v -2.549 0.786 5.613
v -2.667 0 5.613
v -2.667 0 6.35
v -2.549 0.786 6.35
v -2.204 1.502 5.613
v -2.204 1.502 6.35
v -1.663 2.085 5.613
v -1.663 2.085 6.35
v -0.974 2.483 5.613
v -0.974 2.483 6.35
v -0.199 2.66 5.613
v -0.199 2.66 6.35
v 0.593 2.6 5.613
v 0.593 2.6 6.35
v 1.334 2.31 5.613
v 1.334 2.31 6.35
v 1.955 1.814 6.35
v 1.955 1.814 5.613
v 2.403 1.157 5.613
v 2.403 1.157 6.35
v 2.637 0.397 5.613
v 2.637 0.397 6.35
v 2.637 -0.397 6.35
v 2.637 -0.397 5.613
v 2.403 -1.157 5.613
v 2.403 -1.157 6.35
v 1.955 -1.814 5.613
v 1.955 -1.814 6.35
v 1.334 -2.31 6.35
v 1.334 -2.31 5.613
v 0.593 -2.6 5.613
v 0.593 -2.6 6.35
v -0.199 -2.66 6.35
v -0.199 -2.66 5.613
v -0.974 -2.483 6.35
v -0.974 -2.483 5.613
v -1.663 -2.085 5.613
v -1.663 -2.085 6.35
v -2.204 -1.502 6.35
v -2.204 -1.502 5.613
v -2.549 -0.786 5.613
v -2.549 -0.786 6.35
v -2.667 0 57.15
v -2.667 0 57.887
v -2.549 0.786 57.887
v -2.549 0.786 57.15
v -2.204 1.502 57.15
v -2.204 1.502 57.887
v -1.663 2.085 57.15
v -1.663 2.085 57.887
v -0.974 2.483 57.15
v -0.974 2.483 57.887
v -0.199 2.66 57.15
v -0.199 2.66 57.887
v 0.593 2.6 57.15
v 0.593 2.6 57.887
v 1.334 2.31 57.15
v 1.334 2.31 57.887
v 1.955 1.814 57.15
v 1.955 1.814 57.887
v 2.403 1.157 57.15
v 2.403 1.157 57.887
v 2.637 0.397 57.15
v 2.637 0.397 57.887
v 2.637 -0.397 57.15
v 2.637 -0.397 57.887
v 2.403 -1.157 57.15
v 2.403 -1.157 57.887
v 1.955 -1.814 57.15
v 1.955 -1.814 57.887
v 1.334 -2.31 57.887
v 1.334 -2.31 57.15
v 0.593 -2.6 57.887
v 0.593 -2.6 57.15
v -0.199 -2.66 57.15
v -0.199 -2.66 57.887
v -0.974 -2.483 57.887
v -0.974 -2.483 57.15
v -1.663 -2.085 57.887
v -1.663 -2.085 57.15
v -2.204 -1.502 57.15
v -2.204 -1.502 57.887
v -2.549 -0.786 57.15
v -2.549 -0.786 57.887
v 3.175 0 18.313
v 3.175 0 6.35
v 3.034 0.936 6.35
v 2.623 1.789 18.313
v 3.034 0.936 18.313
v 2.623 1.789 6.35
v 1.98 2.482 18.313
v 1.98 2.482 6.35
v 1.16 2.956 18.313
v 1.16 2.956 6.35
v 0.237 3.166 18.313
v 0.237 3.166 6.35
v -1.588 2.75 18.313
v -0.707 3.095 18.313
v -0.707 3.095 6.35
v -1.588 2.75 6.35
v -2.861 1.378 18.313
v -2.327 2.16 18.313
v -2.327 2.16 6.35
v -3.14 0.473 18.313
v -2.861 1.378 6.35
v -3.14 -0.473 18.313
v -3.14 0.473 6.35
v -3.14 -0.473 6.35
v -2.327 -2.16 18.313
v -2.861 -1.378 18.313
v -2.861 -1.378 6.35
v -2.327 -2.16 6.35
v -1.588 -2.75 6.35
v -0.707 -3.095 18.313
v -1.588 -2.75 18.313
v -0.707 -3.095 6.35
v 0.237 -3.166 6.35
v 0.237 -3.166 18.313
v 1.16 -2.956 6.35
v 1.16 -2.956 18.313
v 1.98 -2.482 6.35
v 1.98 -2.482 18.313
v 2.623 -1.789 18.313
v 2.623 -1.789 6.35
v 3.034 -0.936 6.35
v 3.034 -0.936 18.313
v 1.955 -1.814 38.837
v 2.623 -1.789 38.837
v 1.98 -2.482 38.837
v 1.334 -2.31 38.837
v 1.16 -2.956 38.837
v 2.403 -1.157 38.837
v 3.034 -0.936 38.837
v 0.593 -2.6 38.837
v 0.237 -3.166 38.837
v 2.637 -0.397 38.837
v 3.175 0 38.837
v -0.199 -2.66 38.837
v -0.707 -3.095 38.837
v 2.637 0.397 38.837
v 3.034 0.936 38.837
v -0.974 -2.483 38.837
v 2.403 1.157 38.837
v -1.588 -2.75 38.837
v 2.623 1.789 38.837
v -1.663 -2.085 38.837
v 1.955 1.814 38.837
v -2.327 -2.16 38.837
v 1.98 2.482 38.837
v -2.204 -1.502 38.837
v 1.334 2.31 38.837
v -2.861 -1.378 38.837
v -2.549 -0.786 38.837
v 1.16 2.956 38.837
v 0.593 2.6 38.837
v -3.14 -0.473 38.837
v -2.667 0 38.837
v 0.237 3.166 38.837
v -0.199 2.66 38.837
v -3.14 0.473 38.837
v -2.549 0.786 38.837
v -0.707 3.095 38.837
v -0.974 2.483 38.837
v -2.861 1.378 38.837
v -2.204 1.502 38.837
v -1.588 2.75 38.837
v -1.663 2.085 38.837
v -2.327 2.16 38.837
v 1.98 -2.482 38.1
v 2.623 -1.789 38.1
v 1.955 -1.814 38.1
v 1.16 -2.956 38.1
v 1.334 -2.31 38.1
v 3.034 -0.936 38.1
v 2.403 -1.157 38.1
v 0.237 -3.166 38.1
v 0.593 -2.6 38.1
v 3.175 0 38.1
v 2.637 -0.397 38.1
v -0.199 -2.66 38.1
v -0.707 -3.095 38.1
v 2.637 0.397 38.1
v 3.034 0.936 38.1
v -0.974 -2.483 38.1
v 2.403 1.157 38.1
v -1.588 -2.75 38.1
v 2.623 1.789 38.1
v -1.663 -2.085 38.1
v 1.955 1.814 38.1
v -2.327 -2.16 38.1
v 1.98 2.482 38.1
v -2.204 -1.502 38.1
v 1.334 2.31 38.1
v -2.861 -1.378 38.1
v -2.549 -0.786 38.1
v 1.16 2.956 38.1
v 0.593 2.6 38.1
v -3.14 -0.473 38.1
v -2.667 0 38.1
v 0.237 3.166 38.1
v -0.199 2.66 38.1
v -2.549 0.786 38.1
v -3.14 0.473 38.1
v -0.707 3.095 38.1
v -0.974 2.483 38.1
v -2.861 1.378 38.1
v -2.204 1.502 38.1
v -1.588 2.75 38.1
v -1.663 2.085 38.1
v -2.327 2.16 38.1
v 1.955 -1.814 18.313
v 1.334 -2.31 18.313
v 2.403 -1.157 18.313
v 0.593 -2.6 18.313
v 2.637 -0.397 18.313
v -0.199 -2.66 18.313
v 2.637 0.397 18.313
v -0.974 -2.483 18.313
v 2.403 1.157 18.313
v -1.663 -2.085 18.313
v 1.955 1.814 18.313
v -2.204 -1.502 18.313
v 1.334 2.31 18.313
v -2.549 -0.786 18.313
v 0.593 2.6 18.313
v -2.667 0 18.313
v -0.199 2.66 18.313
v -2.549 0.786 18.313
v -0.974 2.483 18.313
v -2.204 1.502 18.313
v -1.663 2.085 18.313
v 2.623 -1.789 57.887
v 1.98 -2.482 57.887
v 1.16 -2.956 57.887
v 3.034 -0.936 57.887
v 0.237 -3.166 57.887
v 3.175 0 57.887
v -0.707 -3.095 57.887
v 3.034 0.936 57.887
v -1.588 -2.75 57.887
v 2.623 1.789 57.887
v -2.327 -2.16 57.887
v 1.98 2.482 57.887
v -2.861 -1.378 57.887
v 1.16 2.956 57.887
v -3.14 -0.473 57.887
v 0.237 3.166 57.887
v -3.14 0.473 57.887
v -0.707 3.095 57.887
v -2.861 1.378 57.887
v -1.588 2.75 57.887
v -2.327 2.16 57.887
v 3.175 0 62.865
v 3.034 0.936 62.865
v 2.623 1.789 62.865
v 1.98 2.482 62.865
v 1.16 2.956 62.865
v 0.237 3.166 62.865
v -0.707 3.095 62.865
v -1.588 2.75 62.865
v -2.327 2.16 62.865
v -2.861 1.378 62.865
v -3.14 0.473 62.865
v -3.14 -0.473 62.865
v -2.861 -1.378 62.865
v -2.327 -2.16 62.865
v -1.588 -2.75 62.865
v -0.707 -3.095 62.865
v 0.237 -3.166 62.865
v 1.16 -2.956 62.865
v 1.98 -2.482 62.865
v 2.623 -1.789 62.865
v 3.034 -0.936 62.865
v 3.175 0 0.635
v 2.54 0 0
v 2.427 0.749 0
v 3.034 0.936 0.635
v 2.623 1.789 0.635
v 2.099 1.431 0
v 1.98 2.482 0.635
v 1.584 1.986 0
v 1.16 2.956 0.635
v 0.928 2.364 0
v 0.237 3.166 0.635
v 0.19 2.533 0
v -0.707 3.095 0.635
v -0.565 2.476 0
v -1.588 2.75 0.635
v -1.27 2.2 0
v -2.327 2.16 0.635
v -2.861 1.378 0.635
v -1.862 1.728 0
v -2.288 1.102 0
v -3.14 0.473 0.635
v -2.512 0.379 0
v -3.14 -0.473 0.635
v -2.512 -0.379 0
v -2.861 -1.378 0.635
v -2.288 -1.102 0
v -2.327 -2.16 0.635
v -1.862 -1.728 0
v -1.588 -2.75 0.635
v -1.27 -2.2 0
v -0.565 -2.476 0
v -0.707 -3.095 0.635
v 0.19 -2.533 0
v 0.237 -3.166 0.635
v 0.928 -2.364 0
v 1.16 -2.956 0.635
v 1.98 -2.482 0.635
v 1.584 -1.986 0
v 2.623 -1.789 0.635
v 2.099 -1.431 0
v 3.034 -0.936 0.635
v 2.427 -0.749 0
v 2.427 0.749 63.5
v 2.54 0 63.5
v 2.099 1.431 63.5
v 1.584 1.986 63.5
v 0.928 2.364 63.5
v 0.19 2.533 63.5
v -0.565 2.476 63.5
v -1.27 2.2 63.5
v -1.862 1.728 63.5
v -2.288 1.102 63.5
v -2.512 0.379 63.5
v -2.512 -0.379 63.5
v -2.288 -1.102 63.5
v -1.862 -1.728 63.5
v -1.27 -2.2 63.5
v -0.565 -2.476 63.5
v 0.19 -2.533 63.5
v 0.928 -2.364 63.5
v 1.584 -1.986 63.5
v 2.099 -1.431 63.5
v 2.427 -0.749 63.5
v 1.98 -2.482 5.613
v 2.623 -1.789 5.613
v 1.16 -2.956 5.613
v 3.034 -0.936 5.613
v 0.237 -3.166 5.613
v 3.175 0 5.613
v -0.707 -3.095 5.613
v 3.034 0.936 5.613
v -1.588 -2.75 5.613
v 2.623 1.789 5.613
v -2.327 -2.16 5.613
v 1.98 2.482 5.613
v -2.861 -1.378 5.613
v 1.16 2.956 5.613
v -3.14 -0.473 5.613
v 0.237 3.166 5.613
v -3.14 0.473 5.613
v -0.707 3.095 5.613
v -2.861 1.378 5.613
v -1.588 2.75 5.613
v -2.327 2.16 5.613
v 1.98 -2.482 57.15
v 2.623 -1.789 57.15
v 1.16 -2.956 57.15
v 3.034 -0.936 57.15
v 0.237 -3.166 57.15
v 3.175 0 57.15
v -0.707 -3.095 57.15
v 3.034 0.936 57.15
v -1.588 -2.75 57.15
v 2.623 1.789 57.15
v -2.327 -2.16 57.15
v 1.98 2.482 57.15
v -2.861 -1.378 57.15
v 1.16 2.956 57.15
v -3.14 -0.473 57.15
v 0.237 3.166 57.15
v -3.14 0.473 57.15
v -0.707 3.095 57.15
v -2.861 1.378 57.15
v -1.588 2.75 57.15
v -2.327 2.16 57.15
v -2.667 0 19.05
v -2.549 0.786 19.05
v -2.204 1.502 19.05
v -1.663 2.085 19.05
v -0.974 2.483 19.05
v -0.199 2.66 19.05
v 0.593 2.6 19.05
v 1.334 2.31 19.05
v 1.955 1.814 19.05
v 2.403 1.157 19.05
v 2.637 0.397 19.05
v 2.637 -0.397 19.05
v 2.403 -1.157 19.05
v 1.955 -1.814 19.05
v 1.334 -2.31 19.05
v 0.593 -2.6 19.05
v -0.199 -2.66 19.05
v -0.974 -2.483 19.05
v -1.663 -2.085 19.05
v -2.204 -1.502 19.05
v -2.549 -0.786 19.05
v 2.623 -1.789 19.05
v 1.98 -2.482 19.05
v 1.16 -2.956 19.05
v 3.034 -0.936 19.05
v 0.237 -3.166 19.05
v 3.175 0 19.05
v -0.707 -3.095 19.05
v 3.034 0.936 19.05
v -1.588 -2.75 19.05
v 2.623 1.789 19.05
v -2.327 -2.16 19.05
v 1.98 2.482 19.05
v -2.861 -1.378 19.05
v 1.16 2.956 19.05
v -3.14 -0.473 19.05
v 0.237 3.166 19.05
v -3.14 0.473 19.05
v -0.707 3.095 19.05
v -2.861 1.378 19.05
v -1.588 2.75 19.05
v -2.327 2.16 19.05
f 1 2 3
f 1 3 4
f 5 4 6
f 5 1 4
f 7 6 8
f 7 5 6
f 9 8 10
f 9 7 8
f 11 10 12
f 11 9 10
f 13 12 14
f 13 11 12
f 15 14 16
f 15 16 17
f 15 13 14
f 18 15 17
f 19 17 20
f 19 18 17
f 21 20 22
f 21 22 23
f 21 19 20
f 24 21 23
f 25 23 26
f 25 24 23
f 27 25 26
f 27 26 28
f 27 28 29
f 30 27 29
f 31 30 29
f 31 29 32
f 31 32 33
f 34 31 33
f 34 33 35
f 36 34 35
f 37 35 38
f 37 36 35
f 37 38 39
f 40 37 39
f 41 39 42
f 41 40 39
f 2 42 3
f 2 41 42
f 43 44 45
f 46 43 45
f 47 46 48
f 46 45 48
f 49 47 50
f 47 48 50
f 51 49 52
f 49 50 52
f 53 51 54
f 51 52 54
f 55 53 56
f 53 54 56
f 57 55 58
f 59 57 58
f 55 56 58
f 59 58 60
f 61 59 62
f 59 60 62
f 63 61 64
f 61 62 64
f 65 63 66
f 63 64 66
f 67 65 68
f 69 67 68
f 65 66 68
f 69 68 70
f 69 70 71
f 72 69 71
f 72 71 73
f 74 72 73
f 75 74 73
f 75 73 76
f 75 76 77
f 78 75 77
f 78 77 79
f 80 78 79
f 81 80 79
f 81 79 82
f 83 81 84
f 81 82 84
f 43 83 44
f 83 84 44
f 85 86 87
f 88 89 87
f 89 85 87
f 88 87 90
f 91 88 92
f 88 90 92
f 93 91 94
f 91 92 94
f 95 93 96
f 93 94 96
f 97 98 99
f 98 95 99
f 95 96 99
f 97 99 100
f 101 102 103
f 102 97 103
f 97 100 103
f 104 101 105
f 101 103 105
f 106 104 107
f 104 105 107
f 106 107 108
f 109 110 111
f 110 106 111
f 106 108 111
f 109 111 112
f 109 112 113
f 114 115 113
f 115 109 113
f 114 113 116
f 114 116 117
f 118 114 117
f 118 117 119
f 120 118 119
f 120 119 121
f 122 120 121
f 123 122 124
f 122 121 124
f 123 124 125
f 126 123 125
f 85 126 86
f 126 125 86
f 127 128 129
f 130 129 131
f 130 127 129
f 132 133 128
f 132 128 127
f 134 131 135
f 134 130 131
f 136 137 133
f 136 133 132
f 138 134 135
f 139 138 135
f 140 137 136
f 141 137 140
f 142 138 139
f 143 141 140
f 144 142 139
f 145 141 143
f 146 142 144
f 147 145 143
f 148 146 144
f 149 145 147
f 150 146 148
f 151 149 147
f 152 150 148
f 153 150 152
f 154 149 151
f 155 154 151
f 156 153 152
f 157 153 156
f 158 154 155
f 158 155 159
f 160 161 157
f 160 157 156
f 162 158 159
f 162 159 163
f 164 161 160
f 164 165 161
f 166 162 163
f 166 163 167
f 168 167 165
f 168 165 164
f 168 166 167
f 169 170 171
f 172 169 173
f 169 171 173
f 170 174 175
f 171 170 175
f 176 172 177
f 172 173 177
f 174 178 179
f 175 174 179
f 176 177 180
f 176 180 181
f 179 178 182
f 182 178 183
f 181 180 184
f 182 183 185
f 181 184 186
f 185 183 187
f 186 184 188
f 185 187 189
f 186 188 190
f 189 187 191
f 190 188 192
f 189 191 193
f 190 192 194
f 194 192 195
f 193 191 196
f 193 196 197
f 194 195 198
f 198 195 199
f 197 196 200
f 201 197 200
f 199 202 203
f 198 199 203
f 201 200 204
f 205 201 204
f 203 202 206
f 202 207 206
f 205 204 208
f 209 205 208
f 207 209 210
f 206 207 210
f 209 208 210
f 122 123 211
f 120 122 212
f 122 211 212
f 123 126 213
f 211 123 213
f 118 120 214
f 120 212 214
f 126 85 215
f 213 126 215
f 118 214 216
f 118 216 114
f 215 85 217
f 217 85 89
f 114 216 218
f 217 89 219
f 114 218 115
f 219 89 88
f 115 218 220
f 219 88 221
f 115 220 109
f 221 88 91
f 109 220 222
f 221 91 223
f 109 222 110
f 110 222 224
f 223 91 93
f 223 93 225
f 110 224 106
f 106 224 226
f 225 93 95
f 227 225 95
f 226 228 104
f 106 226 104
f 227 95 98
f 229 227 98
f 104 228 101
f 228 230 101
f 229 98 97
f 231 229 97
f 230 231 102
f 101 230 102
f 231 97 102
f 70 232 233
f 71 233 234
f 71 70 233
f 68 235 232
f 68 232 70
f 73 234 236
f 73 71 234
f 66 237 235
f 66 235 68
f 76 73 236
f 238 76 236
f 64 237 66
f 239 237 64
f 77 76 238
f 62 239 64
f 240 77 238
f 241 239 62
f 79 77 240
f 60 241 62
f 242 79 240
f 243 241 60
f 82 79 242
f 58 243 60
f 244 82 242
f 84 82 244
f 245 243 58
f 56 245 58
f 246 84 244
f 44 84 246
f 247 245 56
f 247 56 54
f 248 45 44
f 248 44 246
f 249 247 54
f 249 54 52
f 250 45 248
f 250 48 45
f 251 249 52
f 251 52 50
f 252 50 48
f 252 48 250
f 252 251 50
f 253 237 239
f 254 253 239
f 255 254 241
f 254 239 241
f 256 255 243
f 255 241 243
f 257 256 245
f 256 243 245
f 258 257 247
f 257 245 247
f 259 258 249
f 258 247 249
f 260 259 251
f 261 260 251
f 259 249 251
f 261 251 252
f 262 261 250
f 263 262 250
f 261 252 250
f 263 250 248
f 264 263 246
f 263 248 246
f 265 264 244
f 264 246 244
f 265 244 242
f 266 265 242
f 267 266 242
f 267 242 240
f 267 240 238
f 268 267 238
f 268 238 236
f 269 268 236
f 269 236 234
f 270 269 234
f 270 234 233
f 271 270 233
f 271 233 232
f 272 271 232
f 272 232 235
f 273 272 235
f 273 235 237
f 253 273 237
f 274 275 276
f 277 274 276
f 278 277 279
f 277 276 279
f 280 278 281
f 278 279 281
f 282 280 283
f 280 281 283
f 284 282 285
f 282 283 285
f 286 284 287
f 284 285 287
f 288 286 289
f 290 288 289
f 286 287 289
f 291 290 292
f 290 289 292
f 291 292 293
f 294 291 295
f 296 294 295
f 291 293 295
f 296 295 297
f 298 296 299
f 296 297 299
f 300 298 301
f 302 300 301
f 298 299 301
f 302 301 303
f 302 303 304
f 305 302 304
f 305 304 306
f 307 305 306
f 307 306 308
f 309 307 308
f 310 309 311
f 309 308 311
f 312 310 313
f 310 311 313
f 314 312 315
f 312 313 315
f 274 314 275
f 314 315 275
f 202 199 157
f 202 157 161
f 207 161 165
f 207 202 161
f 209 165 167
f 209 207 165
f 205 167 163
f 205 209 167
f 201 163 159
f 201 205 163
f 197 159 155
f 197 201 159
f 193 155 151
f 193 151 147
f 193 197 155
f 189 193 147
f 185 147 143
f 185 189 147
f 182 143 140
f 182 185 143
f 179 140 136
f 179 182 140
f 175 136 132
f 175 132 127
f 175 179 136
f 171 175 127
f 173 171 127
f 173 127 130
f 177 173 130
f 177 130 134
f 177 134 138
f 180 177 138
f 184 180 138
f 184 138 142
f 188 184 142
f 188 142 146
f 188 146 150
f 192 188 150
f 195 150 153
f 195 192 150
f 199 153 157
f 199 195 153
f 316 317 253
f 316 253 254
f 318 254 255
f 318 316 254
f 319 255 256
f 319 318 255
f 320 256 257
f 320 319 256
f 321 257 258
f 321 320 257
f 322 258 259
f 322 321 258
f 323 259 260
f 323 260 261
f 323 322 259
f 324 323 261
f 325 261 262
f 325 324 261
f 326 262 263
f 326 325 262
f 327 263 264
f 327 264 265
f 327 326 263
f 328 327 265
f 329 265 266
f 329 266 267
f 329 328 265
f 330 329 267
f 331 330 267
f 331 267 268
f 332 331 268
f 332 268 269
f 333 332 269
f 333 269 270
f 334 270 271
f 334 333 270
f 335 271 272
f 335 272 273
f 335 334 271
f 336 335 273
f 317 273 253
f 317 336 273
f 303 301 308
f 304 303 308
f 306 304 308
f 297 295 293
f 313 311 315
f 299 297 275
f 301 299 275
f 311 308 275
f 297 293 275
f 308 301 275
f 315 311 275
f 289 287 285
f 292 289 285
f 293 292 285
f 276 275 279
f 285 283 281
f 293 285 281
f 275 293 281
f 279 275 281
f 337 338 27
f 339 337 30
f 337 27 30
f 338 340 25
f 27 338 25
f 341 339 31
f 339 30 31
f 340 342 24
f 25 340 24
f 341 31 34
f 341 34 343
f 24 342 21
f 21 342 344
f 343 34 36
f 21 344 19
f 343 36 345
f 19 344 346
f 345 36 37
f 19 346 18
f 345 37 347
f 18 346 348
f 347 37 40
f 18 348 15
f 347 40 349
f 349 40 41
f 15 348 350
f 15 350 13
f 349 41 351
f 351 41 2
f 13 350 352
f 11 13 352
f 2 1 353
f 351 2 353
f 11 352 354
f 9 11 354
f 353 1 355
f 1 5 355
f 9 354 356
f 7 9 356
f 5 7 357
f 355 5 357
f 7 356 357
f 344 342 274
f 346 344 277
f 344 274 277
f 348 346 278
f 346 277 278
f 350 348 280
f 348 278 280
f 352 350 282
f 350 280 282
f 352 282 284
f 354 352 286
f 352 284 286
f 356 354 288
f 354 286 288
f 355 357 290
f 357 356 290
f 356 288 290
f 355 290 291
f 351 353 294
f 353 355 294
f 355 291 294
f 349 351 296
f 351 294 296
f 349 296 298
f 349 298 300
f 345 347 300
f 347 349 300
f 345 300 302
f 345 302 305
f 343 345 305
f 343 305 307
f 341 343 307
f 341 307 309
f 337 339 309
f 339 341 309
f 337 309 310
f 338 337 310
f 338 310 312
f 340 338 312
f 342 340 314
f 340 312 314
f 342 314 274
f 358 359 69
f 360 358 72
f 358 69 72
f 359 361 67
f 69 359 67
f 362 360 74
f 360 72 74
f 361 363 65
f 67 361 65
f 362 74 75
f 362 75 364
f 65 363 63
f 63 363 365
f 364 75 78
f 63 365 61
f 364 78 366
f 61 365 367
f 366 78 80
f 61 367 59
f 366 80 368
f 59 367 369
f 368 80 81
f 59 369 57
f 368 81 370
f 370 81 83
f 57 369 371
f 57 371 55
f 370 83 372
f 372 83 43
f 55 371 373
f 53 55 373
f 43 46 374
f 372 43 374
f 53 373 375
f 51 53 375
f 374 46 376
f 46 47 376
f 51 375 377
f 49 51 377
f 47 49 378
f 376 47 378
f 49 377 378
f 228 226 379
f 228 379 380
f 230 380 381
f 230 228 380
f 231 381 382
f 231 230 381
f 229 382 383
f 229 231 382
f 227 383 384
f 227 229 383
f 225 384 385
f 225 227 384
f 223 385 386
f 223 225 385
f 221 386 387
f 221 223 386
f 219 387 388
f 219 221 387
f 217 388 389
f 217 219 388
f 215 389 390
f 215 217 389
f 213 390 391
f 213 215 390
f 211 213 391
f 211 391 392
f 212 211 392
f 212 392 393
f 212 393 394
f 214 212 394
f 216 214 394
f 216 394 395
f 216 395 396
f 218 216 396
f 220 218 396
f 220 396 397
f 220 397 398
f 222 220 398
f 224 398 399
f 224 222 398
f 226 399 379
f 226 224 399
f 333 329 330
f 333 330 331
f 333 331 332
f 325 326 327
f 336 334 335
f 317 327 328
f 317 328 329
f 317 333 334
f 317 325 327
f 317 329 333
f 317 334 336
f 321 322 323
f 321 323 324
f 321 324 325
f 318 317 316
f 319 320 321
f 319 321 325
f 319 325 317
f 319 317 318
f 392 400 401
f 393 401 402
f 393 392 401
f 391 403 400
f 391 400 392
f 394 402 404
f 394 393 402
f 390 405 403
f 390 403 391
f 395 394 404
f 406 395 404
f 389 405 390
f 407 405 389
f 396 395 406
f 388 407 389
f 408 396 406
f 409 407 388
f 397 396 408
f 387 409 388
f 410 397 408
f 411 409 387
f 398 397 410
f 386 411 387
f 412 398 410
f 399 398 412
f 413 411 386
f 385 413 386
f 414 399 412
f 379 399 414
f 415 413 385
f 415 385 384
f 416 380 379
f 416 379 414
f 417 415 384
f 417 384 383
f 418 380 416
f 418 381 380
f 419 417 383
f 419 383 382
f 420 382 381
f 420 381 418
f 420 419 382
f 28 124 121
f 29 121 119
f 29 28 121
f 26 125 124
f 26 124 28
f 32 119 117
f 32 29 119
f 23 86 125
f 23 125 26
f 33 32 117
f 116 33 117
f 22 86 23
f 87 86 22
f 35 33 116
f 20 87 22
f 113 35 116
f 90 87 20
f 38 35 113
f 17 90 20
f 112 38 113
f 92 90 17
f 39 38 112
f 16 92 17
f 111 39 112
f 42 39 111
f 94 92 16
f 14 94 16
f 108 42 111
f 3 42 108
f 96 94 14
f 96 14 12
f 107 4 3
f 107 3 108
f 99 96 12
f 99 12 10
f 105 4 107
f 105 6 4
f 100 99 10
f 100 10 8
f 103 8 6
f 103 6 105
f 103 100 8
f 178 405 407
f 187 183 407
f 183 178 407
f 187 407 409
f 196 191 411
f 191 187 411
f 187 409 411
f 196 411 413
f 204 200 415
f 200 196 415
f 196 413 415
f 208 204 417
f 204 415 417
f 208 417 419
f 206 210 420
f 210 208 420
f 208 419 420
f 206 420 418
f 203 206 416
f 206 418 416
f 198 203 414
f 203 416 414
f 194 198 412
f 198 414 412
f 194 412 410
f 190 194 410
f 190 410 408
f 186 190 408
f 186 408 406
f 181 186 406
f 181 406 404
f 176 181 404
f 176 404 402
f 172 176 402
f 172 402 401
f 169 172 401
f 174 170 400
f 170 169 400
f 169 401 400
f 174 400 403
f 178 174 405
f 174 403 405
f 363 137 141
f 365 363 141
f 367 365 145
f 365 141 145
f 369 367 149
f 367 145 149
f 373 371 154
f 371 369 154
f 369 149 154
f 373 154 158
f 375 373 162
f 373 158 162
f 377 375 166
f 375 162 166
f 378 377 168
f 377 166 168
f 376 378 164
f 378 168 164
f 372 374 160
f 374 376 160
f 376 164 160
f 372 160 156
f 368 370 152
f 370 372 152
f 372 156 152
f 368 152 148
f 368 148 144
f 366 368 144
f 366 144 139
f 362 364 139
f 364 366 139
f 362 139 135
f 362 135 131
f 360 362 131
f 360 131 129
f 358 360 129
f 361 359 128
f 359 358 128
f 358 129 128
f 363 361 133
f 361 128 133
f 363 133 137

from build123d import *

# Parameters (mm, degrees)
SKETCH1_R           = 3.175
BOSS_EXTRUDE1_DEPTH = 63.5
CHAMFER1_SIZE       = 0.635
CUT_EXTRUDE1_START  = 0.7366
SKETCH2_R           = 3.175
SKETCH2_R_2         = 2.667
CUT_EXTRUDE1_DEPTH  = 0.7366
CUT_EXTRUDE3_START  = 0.7366
SKETCH4_R           = 3.175
SKETCH4_R_2         = 2.667
CUT_EXTRUDE3_DEPTH  = 0.7366
SKETCH5_R           = 3.175
SKETCH5_R_2         = 2.667
CUT_EXTRUDE4_DEPTH  = 0.7366


with BuildPart() as part:
    # Sketch1 → Boss-Extrude1 (new body)
    with BuildSketch(Plane.XY):
        Circle(SKETCH1_R)
    extrude(amount=BOSS_EXTRUDE1_DEPTH)

    # Chamfer1
    chamfer1_edges = [part.edges().sort_by_distance(p)[0] for p in [
        (-3.175, 0, 0),
        (-3.175, 0, 63.5),
    ]]
    chamfer(chamfer1_edges, length=CHAMFER1_SIZE)

    # Sketch2 → Cut-Extrude1 (cut)
    with BuildSketch(Plane(origin=(0, 0, 19.05), x_dir=(-1, 0, 0), z_dir=(0, 0, -1)).offset(CUT_EXTRUDE1_START)):
        Circle(SKETCH2_R)
        Circle(SKETCH2_R_2, mode=Mode.SUBTRACT)
    extrude(amount=-CUT_EXTRUDE1_DEPTH, mode=Mode.SUBTRACT)

    # Sketch4 → Cut-Extrude3 (cut)
    with BuildSketch(Plane(origin=(0, 0, 6.35), x_dir=(-1, 0, 0), z_dir=(0, 0, -1)).offset(CUT_EXTRUDE3_START)):
        Circle(SKETCH4_R)
        Circle(SKETCH4_R_2, mode=Mode.SUBTRACT)
    cut_extrude3 = extrude(amount=-CUT_EXTRUDE3_DEPTH, mode=Mode.SUBTRACT)

    # Mirror6: Cut-Extrude3 across plane
    add(cut_extrude3.mirror(Plane(origin=(0, 0, 31.75), x_dir=(1, 0, 0), z_dir=(0, 0, -1))), mode=Mode.SUBTRACT)

    # Sketch5 → Cut-Extrude4 (cut)
    with BuildSketch(Plane(origin=(0, 0, 38.1), x_dir=(-1, 0, 0), z_dir=(0, 0, -1))):
        Circle(SKETCH5_R)
        Circle(SKETCH5_R_2, mode=Mode.SUBTRACT)
    extrude(amount=-CUT_EXTRUDE4_DEPTH, mode=Mode.SUBTRACT)


solid = part.part
